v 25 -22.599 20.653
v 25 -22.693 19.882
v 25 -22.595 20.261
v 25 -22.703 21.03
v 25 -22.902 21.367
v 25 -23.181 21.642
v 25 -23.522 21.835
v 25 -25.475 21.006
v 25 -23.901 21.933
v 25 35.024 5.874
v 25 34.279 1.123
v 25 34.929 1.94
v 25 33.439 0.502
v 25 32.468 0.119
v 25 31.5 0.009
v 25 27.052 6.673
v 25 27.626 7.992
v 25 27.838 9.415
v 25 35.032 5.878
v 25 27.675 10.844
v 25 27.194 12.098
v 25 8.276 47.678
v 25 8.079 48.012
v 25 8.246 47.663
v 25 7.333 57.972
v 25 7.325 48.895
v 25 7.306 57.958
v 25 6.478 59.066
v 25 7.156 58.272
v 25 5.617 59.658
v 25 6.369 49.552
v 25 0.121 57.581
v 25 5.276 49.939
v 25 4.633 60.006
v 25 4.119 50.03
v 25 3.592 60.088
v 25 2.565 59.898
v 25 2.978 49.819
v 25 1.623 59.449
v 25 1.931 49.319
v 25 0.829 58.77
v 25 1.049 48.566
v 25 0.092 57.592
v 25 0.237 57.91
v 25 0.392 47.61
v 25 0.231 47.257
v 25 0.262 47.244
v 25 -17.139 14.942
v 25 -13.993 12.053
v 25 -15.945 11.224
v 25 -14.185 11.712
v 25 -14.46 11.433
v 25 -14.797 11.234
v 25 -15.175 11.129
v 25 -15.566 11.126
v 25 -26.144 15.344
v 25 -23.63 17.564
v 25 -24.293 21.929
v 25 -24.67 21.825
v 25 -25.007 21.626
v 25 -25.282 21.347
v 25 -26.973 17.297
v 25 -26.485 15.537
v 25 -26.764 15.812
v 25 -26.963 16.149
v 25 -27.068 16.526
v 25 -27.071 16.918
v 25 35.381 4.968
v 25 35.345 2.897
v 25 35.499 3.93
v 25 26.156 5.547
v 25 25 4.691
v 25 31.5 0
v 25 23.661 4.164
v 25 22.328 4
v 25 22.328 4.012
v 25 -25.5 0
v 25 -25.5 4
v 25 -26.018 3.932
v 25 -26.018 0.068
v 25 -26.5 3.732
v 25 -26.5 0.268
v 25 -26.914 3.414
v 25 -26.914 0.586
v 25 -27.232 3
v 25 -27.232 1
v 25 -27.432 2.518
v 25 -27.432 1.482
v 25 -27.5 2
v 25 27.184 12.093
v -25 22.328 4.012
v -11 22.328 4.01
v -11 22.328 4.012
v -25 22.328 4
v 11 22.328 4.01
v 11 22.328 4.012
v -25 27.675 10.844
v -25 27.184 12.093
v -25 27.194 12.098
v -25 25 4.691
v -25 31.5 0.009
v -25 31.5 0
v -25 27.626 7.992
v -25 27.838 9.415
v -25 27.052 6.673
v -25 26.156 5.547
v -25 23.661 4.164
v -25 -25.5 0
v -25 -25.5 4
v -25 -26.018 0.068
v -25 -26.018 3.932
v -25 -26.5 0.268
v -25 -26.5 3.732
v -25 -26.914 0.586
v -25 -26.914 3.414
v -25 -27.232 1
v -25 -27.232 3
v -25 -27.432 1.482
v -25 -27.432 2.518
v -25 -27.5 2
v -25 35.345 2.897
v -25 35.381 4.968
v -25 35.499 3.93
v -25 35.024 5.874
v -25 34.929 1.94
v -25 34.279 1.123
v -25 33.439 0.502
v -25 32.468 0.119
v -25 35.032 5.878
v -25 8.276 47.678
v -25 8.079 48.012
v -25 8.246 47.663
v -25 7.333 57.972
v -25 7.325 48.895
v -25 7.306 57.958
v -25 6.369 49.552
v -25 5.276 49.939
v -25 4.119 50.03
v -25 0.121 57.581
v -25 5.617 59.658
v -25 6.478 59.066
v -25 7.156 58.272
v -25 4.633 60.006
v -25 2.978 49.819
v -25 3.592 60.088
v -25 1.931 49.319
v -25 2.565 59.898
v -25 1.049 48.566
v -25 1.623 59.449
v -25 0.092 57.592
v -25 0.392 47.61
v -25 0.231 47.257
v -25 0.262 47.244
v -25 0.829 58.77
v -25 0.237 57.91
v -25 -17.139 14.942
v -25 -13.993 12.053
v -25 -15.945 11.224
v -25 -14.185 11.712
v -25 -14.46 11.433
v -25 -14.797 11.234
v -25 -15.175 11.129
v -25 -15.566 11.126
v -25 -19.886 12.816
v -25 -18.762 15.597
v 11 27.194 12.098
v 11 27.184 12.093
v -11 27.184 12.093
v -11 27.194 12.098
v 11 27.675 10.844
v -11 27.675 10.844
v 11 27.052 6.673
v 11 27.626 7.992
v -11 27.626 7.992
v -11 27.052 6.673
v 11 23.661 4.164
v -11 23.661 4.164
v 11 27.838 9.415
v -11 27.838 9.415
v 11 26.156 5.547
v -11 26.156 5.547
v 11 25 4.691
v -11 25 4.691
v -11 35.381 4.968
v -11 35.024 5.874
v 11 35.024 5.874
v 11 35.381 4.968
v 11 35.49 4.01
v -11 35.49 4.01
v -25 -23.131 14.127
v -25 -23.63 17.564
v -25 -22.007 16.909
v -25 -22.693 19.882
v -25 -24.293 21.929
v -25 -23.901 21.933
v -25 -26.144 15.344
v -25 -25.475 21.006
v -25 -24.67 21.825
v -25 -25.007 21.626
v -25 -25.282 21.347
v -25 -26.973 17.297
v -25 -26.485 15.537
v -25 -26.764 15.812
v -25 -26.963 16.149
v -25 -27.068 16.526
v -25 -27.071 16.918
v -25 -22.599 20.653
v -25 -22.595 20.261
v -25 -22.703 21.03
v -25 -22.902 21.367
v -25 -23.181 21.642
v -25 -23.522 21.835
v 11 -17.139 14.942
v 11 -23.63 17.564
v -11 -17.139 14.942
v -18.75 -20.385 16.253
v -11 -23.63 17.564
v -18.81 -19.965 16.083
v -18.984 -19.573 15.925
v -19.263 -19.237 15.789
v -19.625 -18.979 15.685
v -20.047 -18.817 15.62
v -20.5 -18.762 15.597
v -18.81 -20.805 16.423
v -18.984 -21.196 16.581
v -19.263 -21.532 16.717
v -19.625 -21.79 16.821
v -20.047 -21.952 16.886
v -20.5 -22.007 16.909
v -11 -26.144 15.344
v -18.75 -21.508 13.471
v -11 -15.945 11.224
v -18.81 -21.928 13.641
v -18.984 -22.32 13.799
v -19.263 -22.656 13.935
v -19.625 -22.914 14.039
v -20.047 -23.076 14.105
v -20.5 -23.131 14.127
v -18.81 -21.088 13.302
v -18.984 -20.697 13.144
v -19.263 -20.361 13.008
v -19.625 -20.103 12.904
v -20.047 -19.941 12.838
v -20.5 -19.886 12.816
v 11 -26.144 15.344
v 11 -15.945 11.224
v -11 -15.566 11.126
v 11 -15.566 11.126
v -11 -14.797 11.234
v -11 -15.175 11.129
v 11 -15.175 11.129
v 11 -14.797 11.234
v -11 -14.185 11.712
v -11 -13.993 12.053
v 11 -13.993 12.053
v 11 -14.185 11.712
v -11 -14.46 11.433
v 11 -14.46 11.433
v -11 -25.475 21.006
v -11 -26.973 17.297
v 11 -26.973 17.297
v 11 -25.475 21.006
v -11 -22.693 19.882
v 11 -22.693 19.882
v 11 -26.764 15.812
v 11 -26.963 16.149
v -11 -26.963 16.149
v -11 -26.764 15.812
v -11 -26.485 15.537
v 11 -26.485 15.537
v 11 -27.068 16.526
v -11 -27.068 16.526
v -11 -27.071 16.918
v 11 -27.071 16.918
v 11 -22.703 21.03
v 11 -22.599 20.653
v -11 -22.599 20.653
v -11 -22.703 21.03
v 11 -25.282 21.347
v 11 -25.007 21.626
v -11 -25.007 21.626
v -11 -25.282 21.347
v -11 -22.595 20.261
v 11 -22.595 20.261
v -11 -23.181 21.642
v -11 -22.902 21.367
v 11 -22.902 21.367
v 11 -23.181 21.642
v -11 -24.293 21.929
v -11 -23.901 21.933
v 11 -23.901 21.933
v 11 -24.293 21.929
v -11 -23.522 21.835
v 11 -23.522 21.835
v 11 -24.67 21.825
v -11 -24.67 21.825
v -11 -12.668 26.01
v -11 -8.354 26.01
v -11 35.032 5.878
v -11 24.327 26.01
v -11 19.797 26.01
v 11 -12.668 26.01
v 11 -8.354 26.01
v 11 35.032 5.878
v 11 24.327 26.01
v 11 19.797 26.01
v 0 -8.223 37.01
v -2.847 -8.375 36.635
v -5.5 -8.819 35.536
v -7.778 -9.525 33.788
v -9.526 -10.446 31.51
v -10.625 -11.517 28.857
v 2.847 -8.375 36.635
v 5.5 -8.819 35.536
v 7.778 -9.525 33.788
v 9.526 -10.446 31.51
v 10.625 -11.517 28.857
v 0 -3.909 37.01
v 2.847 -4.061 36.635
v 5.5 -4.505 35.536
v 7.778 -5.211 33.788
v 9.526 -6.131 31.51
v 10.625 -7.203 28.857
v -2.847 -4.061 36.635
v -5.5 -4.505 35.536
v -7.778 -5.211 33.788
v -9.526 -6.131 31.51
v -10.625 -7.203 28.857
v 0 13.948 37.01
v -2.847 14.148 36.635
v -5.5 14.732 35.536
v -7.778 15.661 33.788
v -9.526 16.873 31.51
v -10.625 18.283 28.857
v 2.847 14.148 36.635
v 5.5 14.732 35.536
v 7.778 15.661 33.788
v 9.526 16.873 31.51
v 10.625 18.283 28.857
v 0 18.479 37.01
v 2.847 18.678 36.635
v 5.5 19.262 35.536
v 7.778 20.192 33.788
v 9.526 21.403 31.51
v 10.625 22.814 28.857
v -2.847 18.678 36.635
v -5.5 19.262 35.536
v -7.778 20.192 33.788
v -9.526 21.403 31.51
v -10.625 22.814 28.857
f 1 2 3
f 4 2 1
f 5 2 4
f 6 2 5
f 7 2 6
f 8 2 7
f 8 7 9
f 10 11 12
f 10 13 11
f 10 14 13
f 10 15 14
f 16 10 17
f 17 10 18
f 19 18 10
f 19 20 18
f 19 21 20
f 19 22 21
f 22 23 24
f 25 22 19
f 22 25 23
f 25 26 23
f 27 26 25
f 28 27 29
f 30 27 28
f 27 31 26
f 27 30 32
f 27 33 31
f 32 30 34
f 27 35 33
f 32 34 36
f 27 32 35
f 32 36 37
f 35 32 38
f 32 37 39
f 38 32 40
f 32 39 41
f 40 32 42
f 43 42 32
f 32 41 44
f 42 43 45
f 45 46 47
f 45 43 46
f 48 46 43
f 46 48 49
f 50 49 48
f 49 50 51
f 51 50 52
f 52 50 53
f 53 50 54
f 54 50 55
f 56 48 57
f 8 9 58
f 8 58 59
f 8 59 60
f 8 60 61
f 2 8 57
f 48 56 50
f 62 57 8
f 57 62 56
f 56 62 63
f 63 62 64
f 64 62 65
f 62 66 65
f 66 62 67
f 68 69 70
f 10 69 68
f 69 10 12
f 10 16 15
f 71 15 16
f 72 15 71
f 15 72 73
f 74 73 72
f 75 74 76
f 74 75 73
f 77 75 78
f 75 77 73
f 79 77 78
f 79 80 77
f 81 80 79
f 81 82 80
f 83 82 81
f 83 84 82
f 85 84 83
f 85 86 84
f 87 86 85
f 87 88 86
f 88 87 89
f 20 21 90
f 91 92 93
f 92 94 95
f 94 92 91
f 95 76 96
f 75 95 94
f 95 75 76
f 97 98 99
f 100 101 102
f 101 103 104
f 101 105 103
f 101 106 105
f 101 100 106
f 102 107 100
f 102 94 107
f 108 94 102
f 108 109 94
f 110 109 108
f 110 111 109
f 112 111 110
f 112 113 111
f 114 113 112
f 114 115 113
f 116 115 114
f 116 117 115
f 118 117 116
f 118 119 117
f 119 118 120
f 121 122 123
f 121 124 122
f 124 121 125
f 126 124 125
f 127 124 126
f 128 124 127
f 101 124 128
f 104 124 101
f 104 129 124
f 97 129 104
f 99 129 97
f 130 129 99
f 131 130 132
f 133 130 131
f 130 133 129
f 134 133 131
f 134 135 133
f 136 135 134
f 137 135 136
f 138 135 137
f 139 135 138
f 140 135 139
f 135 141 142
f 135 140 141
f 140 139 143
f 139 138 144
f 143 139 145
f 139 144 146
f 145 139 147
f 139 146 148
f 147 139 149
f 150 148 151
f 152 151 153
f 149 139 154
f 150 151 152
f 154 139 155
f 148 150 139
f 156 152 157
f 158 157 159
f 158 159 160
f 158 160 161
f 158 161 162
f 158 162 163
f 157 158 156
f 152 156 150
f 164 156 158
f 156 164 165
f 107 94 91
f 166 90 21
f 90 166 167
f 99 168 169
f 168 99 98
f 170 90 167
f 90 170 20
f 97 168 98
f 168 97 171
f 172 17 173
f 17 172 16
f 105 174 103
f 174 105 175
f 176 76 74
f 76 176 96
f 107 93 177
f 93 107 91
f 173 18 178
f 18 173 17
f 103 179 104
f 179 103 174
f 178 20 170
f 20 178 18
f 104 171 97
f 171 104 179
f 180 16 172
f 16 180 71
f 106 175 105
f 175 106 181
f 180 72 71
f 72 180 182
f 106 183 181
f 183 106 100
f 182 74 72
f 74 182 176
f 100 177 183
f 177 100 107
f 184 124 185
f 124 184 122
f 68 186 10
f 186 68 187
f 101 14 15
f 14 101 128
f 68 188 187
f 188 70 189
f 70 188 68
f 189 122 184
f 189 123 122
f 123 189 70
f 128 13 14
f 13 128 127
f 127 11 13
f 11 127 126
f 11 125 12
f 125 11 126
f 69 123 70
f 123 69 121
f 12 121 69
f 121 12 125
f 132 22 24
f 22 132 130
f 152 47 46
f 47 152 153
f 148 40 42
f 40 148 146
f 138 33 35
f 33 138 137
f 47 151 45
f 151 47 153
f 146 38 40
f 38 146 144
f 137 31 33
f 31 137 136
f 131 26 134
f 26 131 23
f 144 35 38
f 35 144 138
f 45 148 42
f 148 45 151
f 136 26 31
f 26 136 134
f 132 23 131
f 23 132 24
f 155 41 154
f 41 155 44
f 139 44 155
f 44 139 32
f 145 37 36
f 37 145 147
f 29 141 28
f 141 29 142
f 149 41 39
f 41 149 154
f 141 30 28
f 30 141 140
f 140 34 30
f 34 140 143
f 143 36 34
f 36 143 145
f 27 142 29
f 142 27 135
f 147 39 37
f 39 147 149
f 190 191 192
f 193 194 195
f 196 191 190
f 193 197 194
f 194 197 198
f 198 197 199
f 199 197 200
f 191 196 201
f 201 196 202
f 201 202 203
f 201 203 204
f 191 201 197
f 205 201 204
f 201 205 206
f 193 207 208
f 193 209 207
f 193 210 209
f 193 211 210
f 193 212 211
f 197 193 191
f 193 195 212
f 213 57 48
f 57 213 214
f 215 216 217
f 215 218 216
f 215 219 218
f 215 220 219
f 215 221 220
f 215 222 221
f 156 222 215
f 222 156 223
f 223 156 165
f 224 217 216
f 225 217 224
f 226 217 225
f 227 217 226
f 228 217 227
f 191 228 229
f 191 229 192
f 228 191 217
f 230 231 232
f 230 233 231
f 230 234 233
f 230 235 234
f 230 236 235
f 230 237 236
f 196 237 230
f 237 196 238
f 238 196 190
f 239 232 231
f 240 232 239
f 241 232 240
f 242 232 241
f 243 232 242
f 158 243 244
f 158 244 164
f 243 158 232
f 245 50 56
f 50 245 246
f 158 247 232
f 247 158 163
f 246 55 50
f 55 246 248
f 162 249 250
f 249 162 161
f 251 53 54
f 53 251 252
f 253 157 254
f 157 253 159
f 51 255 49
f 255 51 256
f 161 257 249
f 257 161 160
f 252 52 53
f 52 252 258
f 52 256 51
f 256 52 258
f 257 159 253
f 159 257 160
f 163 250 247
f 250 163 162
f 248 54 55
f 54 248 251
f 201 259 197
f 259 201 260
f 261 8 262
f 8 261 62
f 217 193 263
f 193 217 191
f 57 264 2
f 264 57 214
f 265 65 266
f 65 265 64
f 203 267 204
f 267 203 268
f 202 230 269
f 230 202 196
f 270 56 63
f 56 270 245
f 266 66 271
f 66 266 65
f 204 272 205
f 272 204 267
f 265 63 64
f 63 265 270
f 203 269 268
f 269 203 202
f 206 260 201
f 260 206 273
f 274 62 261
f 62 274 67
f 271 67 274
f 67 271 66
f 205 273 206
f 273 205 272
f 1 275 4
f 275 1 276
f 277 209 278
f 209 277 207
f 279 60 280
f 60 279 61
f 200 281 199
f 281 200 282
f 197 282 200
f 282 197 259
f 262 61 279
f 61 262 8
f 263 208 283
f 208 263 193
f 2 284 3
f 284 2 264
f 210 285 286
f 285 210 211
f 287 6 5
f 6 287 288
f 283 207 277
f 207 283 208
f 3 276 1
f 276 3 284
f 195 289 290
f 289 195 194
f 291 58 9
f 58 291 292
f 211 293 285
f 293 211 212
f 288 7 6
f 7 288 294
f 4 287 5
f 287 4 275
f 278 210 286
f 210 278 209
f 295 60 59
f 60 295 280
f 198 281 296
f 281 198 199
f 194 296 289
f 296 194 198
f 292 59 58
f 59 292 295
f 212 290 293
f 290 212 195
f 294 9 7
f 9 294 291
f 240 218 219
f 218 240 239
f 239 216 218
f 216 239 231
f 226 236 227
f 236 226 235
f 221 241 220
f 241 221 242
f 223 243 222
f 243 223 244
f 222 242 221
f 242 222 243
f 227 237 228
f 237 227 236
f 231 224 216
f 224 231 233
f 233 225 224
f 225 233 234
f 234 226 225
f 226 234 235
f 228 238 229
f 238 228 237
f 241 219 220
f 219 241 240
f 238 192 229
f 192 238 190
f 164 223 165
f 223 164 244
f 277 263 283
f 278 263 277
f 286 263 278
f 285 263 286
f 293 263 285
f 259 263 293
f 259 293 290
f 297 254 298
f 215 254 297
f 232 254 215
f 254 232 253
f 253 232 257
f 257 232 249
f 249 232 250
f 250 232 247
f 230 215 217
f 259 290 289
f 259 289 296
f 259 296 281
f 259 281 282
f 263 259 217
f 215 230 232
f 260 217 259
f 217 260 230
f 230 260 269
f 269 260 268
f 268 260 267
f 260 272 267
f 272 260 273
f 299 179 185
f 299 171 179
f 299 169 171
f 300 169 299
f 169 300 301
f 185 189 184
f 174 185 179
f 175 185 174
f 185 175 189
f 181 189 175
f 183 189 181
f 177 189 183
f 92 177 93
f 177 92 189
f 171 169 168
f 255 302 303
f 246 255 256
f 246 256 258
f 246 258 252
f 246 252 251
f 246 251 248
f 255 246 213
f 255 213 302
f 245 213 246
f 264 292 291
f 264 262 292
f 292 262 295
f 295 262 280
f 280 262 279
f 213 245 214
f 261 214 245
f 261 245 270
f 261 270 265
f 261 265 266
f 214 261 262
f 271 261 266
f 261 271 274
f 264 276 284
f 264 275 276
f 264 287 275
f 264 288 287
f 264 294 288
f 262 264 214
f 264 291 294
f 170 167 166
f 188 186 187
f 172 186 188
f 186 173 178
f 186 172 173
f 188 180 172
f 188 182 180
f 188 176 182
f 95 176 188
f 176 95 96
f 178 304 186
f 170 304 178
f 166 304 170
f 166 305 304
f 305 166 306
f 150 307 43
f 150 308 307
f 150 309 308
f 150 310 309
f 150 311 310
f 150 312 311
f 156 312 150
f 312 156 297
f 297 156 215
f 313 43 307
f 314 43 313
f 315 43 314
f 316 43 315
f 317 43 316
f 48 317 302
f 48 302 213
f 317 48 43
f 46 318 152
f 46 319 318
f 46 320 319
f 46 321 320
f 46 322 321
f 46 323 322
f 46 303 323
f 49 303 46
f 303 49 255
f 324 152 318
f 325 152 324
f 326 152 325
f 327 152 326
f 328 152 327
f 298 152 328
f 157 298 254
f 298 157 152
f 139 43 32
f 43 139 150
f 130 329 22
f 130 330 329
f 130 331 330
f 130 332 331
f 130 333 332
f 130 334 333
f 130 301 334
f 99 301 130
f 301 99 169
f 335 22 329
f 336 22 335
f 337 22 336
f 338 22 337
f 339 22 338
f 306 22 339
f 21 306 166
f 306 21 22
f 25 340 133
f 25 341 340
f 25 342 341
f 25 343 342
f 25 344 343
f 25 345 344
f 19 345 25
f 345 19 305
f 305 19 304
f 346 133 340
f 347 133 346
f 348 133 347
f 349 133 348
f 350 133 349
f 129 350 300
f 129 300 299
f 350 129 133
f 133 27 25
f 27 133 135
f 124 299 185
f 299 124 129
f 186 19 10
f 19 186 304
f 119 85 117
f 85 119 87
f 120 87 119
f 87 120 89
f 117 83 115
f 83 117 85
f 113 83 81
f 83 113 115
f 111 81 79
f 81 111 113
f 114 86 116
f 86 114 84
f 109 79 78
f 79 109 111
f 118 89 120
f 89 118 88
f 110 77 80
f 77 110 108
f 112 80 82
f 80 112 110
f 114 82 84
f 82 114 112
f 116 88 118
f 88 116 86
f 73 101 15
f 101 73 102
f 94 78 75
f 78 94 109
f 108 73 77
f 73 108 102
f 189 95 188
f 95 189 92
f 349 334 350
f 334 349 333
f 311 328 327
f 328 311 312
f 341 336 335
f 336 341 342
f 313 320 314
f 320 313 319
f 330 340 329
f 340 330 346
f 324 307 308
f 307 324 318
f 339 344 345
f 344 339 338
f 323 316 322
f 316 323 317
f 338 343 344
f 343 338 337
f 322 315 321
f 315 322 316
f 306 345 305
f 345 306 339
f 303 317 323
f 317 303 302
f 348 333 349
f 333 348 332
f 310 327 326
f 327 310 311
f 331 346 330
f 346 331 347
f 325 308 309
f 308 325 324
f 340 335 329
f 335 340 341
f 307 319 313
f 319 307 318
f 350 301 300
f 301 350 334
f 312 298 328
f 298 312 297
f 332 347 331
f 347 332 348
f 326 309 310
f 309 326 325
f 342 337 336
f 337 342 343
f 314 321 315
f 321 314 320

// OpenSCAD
// OpenSCAD file to create custom sized/configured phone or tablet stand.
//
// preview[view:south east, tilt:top diagonal]
//
// Created May 29th, 2018 by Allan M. Estes
// First upload to Thingiverse Feb. 16th, 2019
//
// to do:
//   allow interior corner fillets to be scalled
//
// Last modified Feb. 16th, 2019

orientation = 1; // [1:for viewing,0:for printing]
// - how thick the base, back and face will be.
thick = 4;
// - overall width of stand.
stand_width  = 50;
// (base dimensions are width x base_length x thick)
base_length  = 63;  // outside measure
// (back dimensions are width x back_length x thick)
back_length = 67;  // back outside measure
// - zero degrees is folded flat against base, ninety is vertical.
back_angle  = 62;  // [1:179]
// (face/front dimensions are width x face_length x thick)
face_length  = 53;  // face outside measure
// - zero degrees is horizontal, negative ninety is hanging vertically.
face_angle  = -68;  // [-90:0]

// - device rests on ledge, it should equal or excced device thickness
ledge = 7;  // inside measure
// - creates opening in ledge (for charge cable, etc.), 0 to disable
ledge_gap_length = 22;
// - gap position: >0 moves gap left of stand center, <0 moves right
ledge_gap_offset = 0;

// - size of notch at end/edge of ledge (headphone plug, speaker, etc.), 0 for none, >0 on left end, <0 on right end
ledge_edge_slot_length = 9;
ledge_edge_slot_width = 3.5;
ledge_edge_slot_pos = 0;    // [1:back of ledge,0:center of ledge,-1:front_of ledge]

// - opening in back and face (depending on angles and sizes) of stand
arch_width  = 22;        // must be narrower than width
arch_height = 33;       // must be larger than or equal to arch_width

// - internal fill at bends.
fillet = 2; // [1:minumum, 2:light, 3:medium, 4:heavy, 5:maximum]

module dummy(x) {
}

$fn=24;

lip = 2.5;  //outside measure

ledge_thick = thick * .75;
ledge_edge_slot_pct = min(ledge,ledge_edge_slot_width)/ledge;

width = stand_width;
base  = base_length-thick*1.5;
back = back_length-thick*2;
face  = face_length-thick-ledge_thick/2;

base_back_angle = back_angle;
back_face_angle =  180+face_angle-back_angle;

orient_x   = orientation ? width/2 : -base/2;
orient_y   = orientation ? base_length/2 : -sin(back_angle)*back_length/2;
orient_rot = orientation ? 90 : 0;

//  Start of Code...

module fold(angle,radius,hgt) {
foo = min(angle,90)/90 * fillet;
thy = radius*foo/sin(angle/2);
hy = radius*foo*1.1/sin(angle/2);
hi = radius*foo*1.1*cos(angle/2);
ry = radius*1.1/sin(angle/2);
ri = radius*1.1*cos(angle/2);
x = hi/tan(angle/2);
    // fillet
    difference(){
        translate([(thy-hy),0,0]) linear_extrude(height=hgt) polygon([[0,0],[x,hi],[hy,0],[x,-hi]]);
    
        translate([thy,0,-.1])
        cylinder(r=radius*foo,h=hgt+.2);
    }
    // rounding
    difference(){
        cylinder(r=radius,h=hgt);
        translate([0,0,-.1]) linear_extrude(height=hgt+.2) polygon([[0,0],[ri,ry],[ry,ry],[ry,-ry],[ri,-ry]]);
    }
}


module ledge_slots() {
    if (ledge_gap_length>0) translate([thick,-.1,width/2+ledge_gap_offset-ledge_gap_length/2])
    cube([ledge+thick,lip*4+.1,ledge_gap_length]);

    if (ledge_edge_slot_length>0) translate([ledge/2+thick+((1-ledge_edge_slot_pct)*ledge/2*ledge_edge_slot_pos),-.1,width-ledge_edge_slot_length/2]) {
        rotate([-90,90,0])
        cylinder(d=ledge*ledge_edge_slot_pct,h=ledge_thick+.2);
        translate([-ledge/2*ledge_edge_slot_pct,0,0])
        cube([ledge*ledge_edge_slot_pct,ledge_thick+.2,ledge_edge_slot_length]);
    }

    if (ledge_edge_slot_length<0) translate([ledge/2+thick+((ledge_edge_slot_pct)*ledge/2*ledge_edge_slot_pos),-.1,-ledge_edge_slot_length-ledge/2]) {
        rotate([-90,90,0])
        cylinder(d=ledge*ledge_edge_slot_pct,h=ledge_thick+.2);
        translate([-ledge/2*ledge_edge_slot_pct,0,ledge_edge_slot_length])
        cube([ledge*ledge_edge_slot_pct,ledge_thick+.2,-ledge_edge_slot_length]);
    }
}


translate([orient_x,orient_y,0]) rotate([orient_rot,0,-orient_rot])  // position for display or printing
difference() {
    union() {
        //base/back rounding&fillet
        translate([0,thick,0]) rotate(base_back_angle/2,0,0) fold(base_back_angle,thick,width);
        //base front rounding
        translate([base,thick/2,0])
        cylinder(d=thick,h=width);
        //base
        cube([base,thick,width]);
        
        translate([0,thick,0]) rotate([0,0,base_back_angle-90]) {
            //back
            translate([-thick,0,0]) cube([thick,back,width]);
        
            translate([0,back,0]) rotate([0,0,back_face_angle]) translate([0,-face,0]) {
                //face/back rounding&fillet
                translate([0,face,0]) rotate([0,0,-90-back_face_angle/2]) fold(back_face_angle,thick,width);
                //face
                cube([thick,face,width]);

                translate([0,-ledge_thick/2,0]) difference() { // ledge w/holes) & lip
                    union() {
                        translate([ledge_thick/2,0,0]) {
                            //ledge
                            cube([ledge+thick,ledge_thick,width]);
                            //face+ledge rounding
                            translate([0,ledge_thick/2,0])
                            cylinder(d=ledge_thick,h=width);
                        }
                        translate([ledge+thick+ledge_thick/2,ledge_thick/2,0]){
                            //lip
                            translate([-ledge_thick/2,0,0])
                            cube([ledge_thick,lip+(ledge_thick/2),width]);
                            //ledge+lip rounding
                            cylinder(d=ledge_thick,h=width);
                            //lip rounding
                            translate([0,lip+(ledge_thick/2),0])
                            cylinder(d=ledge_thick,h=width);
                        }
                    }
                    ledge_slots();
                }
            }
        }
    }
    //through hole
    translate([-base,thick+.01,(width-arch_width)/2])
    union(){
        cube([base*2.5,arch_height-arch_width/2,arch_width]);
        translate([0,arch_height-arch_width/2,arch_width/2])
        rotate([0,90,0])
        cylinder(d=arch_width,h=base*2.5);
    }
}
